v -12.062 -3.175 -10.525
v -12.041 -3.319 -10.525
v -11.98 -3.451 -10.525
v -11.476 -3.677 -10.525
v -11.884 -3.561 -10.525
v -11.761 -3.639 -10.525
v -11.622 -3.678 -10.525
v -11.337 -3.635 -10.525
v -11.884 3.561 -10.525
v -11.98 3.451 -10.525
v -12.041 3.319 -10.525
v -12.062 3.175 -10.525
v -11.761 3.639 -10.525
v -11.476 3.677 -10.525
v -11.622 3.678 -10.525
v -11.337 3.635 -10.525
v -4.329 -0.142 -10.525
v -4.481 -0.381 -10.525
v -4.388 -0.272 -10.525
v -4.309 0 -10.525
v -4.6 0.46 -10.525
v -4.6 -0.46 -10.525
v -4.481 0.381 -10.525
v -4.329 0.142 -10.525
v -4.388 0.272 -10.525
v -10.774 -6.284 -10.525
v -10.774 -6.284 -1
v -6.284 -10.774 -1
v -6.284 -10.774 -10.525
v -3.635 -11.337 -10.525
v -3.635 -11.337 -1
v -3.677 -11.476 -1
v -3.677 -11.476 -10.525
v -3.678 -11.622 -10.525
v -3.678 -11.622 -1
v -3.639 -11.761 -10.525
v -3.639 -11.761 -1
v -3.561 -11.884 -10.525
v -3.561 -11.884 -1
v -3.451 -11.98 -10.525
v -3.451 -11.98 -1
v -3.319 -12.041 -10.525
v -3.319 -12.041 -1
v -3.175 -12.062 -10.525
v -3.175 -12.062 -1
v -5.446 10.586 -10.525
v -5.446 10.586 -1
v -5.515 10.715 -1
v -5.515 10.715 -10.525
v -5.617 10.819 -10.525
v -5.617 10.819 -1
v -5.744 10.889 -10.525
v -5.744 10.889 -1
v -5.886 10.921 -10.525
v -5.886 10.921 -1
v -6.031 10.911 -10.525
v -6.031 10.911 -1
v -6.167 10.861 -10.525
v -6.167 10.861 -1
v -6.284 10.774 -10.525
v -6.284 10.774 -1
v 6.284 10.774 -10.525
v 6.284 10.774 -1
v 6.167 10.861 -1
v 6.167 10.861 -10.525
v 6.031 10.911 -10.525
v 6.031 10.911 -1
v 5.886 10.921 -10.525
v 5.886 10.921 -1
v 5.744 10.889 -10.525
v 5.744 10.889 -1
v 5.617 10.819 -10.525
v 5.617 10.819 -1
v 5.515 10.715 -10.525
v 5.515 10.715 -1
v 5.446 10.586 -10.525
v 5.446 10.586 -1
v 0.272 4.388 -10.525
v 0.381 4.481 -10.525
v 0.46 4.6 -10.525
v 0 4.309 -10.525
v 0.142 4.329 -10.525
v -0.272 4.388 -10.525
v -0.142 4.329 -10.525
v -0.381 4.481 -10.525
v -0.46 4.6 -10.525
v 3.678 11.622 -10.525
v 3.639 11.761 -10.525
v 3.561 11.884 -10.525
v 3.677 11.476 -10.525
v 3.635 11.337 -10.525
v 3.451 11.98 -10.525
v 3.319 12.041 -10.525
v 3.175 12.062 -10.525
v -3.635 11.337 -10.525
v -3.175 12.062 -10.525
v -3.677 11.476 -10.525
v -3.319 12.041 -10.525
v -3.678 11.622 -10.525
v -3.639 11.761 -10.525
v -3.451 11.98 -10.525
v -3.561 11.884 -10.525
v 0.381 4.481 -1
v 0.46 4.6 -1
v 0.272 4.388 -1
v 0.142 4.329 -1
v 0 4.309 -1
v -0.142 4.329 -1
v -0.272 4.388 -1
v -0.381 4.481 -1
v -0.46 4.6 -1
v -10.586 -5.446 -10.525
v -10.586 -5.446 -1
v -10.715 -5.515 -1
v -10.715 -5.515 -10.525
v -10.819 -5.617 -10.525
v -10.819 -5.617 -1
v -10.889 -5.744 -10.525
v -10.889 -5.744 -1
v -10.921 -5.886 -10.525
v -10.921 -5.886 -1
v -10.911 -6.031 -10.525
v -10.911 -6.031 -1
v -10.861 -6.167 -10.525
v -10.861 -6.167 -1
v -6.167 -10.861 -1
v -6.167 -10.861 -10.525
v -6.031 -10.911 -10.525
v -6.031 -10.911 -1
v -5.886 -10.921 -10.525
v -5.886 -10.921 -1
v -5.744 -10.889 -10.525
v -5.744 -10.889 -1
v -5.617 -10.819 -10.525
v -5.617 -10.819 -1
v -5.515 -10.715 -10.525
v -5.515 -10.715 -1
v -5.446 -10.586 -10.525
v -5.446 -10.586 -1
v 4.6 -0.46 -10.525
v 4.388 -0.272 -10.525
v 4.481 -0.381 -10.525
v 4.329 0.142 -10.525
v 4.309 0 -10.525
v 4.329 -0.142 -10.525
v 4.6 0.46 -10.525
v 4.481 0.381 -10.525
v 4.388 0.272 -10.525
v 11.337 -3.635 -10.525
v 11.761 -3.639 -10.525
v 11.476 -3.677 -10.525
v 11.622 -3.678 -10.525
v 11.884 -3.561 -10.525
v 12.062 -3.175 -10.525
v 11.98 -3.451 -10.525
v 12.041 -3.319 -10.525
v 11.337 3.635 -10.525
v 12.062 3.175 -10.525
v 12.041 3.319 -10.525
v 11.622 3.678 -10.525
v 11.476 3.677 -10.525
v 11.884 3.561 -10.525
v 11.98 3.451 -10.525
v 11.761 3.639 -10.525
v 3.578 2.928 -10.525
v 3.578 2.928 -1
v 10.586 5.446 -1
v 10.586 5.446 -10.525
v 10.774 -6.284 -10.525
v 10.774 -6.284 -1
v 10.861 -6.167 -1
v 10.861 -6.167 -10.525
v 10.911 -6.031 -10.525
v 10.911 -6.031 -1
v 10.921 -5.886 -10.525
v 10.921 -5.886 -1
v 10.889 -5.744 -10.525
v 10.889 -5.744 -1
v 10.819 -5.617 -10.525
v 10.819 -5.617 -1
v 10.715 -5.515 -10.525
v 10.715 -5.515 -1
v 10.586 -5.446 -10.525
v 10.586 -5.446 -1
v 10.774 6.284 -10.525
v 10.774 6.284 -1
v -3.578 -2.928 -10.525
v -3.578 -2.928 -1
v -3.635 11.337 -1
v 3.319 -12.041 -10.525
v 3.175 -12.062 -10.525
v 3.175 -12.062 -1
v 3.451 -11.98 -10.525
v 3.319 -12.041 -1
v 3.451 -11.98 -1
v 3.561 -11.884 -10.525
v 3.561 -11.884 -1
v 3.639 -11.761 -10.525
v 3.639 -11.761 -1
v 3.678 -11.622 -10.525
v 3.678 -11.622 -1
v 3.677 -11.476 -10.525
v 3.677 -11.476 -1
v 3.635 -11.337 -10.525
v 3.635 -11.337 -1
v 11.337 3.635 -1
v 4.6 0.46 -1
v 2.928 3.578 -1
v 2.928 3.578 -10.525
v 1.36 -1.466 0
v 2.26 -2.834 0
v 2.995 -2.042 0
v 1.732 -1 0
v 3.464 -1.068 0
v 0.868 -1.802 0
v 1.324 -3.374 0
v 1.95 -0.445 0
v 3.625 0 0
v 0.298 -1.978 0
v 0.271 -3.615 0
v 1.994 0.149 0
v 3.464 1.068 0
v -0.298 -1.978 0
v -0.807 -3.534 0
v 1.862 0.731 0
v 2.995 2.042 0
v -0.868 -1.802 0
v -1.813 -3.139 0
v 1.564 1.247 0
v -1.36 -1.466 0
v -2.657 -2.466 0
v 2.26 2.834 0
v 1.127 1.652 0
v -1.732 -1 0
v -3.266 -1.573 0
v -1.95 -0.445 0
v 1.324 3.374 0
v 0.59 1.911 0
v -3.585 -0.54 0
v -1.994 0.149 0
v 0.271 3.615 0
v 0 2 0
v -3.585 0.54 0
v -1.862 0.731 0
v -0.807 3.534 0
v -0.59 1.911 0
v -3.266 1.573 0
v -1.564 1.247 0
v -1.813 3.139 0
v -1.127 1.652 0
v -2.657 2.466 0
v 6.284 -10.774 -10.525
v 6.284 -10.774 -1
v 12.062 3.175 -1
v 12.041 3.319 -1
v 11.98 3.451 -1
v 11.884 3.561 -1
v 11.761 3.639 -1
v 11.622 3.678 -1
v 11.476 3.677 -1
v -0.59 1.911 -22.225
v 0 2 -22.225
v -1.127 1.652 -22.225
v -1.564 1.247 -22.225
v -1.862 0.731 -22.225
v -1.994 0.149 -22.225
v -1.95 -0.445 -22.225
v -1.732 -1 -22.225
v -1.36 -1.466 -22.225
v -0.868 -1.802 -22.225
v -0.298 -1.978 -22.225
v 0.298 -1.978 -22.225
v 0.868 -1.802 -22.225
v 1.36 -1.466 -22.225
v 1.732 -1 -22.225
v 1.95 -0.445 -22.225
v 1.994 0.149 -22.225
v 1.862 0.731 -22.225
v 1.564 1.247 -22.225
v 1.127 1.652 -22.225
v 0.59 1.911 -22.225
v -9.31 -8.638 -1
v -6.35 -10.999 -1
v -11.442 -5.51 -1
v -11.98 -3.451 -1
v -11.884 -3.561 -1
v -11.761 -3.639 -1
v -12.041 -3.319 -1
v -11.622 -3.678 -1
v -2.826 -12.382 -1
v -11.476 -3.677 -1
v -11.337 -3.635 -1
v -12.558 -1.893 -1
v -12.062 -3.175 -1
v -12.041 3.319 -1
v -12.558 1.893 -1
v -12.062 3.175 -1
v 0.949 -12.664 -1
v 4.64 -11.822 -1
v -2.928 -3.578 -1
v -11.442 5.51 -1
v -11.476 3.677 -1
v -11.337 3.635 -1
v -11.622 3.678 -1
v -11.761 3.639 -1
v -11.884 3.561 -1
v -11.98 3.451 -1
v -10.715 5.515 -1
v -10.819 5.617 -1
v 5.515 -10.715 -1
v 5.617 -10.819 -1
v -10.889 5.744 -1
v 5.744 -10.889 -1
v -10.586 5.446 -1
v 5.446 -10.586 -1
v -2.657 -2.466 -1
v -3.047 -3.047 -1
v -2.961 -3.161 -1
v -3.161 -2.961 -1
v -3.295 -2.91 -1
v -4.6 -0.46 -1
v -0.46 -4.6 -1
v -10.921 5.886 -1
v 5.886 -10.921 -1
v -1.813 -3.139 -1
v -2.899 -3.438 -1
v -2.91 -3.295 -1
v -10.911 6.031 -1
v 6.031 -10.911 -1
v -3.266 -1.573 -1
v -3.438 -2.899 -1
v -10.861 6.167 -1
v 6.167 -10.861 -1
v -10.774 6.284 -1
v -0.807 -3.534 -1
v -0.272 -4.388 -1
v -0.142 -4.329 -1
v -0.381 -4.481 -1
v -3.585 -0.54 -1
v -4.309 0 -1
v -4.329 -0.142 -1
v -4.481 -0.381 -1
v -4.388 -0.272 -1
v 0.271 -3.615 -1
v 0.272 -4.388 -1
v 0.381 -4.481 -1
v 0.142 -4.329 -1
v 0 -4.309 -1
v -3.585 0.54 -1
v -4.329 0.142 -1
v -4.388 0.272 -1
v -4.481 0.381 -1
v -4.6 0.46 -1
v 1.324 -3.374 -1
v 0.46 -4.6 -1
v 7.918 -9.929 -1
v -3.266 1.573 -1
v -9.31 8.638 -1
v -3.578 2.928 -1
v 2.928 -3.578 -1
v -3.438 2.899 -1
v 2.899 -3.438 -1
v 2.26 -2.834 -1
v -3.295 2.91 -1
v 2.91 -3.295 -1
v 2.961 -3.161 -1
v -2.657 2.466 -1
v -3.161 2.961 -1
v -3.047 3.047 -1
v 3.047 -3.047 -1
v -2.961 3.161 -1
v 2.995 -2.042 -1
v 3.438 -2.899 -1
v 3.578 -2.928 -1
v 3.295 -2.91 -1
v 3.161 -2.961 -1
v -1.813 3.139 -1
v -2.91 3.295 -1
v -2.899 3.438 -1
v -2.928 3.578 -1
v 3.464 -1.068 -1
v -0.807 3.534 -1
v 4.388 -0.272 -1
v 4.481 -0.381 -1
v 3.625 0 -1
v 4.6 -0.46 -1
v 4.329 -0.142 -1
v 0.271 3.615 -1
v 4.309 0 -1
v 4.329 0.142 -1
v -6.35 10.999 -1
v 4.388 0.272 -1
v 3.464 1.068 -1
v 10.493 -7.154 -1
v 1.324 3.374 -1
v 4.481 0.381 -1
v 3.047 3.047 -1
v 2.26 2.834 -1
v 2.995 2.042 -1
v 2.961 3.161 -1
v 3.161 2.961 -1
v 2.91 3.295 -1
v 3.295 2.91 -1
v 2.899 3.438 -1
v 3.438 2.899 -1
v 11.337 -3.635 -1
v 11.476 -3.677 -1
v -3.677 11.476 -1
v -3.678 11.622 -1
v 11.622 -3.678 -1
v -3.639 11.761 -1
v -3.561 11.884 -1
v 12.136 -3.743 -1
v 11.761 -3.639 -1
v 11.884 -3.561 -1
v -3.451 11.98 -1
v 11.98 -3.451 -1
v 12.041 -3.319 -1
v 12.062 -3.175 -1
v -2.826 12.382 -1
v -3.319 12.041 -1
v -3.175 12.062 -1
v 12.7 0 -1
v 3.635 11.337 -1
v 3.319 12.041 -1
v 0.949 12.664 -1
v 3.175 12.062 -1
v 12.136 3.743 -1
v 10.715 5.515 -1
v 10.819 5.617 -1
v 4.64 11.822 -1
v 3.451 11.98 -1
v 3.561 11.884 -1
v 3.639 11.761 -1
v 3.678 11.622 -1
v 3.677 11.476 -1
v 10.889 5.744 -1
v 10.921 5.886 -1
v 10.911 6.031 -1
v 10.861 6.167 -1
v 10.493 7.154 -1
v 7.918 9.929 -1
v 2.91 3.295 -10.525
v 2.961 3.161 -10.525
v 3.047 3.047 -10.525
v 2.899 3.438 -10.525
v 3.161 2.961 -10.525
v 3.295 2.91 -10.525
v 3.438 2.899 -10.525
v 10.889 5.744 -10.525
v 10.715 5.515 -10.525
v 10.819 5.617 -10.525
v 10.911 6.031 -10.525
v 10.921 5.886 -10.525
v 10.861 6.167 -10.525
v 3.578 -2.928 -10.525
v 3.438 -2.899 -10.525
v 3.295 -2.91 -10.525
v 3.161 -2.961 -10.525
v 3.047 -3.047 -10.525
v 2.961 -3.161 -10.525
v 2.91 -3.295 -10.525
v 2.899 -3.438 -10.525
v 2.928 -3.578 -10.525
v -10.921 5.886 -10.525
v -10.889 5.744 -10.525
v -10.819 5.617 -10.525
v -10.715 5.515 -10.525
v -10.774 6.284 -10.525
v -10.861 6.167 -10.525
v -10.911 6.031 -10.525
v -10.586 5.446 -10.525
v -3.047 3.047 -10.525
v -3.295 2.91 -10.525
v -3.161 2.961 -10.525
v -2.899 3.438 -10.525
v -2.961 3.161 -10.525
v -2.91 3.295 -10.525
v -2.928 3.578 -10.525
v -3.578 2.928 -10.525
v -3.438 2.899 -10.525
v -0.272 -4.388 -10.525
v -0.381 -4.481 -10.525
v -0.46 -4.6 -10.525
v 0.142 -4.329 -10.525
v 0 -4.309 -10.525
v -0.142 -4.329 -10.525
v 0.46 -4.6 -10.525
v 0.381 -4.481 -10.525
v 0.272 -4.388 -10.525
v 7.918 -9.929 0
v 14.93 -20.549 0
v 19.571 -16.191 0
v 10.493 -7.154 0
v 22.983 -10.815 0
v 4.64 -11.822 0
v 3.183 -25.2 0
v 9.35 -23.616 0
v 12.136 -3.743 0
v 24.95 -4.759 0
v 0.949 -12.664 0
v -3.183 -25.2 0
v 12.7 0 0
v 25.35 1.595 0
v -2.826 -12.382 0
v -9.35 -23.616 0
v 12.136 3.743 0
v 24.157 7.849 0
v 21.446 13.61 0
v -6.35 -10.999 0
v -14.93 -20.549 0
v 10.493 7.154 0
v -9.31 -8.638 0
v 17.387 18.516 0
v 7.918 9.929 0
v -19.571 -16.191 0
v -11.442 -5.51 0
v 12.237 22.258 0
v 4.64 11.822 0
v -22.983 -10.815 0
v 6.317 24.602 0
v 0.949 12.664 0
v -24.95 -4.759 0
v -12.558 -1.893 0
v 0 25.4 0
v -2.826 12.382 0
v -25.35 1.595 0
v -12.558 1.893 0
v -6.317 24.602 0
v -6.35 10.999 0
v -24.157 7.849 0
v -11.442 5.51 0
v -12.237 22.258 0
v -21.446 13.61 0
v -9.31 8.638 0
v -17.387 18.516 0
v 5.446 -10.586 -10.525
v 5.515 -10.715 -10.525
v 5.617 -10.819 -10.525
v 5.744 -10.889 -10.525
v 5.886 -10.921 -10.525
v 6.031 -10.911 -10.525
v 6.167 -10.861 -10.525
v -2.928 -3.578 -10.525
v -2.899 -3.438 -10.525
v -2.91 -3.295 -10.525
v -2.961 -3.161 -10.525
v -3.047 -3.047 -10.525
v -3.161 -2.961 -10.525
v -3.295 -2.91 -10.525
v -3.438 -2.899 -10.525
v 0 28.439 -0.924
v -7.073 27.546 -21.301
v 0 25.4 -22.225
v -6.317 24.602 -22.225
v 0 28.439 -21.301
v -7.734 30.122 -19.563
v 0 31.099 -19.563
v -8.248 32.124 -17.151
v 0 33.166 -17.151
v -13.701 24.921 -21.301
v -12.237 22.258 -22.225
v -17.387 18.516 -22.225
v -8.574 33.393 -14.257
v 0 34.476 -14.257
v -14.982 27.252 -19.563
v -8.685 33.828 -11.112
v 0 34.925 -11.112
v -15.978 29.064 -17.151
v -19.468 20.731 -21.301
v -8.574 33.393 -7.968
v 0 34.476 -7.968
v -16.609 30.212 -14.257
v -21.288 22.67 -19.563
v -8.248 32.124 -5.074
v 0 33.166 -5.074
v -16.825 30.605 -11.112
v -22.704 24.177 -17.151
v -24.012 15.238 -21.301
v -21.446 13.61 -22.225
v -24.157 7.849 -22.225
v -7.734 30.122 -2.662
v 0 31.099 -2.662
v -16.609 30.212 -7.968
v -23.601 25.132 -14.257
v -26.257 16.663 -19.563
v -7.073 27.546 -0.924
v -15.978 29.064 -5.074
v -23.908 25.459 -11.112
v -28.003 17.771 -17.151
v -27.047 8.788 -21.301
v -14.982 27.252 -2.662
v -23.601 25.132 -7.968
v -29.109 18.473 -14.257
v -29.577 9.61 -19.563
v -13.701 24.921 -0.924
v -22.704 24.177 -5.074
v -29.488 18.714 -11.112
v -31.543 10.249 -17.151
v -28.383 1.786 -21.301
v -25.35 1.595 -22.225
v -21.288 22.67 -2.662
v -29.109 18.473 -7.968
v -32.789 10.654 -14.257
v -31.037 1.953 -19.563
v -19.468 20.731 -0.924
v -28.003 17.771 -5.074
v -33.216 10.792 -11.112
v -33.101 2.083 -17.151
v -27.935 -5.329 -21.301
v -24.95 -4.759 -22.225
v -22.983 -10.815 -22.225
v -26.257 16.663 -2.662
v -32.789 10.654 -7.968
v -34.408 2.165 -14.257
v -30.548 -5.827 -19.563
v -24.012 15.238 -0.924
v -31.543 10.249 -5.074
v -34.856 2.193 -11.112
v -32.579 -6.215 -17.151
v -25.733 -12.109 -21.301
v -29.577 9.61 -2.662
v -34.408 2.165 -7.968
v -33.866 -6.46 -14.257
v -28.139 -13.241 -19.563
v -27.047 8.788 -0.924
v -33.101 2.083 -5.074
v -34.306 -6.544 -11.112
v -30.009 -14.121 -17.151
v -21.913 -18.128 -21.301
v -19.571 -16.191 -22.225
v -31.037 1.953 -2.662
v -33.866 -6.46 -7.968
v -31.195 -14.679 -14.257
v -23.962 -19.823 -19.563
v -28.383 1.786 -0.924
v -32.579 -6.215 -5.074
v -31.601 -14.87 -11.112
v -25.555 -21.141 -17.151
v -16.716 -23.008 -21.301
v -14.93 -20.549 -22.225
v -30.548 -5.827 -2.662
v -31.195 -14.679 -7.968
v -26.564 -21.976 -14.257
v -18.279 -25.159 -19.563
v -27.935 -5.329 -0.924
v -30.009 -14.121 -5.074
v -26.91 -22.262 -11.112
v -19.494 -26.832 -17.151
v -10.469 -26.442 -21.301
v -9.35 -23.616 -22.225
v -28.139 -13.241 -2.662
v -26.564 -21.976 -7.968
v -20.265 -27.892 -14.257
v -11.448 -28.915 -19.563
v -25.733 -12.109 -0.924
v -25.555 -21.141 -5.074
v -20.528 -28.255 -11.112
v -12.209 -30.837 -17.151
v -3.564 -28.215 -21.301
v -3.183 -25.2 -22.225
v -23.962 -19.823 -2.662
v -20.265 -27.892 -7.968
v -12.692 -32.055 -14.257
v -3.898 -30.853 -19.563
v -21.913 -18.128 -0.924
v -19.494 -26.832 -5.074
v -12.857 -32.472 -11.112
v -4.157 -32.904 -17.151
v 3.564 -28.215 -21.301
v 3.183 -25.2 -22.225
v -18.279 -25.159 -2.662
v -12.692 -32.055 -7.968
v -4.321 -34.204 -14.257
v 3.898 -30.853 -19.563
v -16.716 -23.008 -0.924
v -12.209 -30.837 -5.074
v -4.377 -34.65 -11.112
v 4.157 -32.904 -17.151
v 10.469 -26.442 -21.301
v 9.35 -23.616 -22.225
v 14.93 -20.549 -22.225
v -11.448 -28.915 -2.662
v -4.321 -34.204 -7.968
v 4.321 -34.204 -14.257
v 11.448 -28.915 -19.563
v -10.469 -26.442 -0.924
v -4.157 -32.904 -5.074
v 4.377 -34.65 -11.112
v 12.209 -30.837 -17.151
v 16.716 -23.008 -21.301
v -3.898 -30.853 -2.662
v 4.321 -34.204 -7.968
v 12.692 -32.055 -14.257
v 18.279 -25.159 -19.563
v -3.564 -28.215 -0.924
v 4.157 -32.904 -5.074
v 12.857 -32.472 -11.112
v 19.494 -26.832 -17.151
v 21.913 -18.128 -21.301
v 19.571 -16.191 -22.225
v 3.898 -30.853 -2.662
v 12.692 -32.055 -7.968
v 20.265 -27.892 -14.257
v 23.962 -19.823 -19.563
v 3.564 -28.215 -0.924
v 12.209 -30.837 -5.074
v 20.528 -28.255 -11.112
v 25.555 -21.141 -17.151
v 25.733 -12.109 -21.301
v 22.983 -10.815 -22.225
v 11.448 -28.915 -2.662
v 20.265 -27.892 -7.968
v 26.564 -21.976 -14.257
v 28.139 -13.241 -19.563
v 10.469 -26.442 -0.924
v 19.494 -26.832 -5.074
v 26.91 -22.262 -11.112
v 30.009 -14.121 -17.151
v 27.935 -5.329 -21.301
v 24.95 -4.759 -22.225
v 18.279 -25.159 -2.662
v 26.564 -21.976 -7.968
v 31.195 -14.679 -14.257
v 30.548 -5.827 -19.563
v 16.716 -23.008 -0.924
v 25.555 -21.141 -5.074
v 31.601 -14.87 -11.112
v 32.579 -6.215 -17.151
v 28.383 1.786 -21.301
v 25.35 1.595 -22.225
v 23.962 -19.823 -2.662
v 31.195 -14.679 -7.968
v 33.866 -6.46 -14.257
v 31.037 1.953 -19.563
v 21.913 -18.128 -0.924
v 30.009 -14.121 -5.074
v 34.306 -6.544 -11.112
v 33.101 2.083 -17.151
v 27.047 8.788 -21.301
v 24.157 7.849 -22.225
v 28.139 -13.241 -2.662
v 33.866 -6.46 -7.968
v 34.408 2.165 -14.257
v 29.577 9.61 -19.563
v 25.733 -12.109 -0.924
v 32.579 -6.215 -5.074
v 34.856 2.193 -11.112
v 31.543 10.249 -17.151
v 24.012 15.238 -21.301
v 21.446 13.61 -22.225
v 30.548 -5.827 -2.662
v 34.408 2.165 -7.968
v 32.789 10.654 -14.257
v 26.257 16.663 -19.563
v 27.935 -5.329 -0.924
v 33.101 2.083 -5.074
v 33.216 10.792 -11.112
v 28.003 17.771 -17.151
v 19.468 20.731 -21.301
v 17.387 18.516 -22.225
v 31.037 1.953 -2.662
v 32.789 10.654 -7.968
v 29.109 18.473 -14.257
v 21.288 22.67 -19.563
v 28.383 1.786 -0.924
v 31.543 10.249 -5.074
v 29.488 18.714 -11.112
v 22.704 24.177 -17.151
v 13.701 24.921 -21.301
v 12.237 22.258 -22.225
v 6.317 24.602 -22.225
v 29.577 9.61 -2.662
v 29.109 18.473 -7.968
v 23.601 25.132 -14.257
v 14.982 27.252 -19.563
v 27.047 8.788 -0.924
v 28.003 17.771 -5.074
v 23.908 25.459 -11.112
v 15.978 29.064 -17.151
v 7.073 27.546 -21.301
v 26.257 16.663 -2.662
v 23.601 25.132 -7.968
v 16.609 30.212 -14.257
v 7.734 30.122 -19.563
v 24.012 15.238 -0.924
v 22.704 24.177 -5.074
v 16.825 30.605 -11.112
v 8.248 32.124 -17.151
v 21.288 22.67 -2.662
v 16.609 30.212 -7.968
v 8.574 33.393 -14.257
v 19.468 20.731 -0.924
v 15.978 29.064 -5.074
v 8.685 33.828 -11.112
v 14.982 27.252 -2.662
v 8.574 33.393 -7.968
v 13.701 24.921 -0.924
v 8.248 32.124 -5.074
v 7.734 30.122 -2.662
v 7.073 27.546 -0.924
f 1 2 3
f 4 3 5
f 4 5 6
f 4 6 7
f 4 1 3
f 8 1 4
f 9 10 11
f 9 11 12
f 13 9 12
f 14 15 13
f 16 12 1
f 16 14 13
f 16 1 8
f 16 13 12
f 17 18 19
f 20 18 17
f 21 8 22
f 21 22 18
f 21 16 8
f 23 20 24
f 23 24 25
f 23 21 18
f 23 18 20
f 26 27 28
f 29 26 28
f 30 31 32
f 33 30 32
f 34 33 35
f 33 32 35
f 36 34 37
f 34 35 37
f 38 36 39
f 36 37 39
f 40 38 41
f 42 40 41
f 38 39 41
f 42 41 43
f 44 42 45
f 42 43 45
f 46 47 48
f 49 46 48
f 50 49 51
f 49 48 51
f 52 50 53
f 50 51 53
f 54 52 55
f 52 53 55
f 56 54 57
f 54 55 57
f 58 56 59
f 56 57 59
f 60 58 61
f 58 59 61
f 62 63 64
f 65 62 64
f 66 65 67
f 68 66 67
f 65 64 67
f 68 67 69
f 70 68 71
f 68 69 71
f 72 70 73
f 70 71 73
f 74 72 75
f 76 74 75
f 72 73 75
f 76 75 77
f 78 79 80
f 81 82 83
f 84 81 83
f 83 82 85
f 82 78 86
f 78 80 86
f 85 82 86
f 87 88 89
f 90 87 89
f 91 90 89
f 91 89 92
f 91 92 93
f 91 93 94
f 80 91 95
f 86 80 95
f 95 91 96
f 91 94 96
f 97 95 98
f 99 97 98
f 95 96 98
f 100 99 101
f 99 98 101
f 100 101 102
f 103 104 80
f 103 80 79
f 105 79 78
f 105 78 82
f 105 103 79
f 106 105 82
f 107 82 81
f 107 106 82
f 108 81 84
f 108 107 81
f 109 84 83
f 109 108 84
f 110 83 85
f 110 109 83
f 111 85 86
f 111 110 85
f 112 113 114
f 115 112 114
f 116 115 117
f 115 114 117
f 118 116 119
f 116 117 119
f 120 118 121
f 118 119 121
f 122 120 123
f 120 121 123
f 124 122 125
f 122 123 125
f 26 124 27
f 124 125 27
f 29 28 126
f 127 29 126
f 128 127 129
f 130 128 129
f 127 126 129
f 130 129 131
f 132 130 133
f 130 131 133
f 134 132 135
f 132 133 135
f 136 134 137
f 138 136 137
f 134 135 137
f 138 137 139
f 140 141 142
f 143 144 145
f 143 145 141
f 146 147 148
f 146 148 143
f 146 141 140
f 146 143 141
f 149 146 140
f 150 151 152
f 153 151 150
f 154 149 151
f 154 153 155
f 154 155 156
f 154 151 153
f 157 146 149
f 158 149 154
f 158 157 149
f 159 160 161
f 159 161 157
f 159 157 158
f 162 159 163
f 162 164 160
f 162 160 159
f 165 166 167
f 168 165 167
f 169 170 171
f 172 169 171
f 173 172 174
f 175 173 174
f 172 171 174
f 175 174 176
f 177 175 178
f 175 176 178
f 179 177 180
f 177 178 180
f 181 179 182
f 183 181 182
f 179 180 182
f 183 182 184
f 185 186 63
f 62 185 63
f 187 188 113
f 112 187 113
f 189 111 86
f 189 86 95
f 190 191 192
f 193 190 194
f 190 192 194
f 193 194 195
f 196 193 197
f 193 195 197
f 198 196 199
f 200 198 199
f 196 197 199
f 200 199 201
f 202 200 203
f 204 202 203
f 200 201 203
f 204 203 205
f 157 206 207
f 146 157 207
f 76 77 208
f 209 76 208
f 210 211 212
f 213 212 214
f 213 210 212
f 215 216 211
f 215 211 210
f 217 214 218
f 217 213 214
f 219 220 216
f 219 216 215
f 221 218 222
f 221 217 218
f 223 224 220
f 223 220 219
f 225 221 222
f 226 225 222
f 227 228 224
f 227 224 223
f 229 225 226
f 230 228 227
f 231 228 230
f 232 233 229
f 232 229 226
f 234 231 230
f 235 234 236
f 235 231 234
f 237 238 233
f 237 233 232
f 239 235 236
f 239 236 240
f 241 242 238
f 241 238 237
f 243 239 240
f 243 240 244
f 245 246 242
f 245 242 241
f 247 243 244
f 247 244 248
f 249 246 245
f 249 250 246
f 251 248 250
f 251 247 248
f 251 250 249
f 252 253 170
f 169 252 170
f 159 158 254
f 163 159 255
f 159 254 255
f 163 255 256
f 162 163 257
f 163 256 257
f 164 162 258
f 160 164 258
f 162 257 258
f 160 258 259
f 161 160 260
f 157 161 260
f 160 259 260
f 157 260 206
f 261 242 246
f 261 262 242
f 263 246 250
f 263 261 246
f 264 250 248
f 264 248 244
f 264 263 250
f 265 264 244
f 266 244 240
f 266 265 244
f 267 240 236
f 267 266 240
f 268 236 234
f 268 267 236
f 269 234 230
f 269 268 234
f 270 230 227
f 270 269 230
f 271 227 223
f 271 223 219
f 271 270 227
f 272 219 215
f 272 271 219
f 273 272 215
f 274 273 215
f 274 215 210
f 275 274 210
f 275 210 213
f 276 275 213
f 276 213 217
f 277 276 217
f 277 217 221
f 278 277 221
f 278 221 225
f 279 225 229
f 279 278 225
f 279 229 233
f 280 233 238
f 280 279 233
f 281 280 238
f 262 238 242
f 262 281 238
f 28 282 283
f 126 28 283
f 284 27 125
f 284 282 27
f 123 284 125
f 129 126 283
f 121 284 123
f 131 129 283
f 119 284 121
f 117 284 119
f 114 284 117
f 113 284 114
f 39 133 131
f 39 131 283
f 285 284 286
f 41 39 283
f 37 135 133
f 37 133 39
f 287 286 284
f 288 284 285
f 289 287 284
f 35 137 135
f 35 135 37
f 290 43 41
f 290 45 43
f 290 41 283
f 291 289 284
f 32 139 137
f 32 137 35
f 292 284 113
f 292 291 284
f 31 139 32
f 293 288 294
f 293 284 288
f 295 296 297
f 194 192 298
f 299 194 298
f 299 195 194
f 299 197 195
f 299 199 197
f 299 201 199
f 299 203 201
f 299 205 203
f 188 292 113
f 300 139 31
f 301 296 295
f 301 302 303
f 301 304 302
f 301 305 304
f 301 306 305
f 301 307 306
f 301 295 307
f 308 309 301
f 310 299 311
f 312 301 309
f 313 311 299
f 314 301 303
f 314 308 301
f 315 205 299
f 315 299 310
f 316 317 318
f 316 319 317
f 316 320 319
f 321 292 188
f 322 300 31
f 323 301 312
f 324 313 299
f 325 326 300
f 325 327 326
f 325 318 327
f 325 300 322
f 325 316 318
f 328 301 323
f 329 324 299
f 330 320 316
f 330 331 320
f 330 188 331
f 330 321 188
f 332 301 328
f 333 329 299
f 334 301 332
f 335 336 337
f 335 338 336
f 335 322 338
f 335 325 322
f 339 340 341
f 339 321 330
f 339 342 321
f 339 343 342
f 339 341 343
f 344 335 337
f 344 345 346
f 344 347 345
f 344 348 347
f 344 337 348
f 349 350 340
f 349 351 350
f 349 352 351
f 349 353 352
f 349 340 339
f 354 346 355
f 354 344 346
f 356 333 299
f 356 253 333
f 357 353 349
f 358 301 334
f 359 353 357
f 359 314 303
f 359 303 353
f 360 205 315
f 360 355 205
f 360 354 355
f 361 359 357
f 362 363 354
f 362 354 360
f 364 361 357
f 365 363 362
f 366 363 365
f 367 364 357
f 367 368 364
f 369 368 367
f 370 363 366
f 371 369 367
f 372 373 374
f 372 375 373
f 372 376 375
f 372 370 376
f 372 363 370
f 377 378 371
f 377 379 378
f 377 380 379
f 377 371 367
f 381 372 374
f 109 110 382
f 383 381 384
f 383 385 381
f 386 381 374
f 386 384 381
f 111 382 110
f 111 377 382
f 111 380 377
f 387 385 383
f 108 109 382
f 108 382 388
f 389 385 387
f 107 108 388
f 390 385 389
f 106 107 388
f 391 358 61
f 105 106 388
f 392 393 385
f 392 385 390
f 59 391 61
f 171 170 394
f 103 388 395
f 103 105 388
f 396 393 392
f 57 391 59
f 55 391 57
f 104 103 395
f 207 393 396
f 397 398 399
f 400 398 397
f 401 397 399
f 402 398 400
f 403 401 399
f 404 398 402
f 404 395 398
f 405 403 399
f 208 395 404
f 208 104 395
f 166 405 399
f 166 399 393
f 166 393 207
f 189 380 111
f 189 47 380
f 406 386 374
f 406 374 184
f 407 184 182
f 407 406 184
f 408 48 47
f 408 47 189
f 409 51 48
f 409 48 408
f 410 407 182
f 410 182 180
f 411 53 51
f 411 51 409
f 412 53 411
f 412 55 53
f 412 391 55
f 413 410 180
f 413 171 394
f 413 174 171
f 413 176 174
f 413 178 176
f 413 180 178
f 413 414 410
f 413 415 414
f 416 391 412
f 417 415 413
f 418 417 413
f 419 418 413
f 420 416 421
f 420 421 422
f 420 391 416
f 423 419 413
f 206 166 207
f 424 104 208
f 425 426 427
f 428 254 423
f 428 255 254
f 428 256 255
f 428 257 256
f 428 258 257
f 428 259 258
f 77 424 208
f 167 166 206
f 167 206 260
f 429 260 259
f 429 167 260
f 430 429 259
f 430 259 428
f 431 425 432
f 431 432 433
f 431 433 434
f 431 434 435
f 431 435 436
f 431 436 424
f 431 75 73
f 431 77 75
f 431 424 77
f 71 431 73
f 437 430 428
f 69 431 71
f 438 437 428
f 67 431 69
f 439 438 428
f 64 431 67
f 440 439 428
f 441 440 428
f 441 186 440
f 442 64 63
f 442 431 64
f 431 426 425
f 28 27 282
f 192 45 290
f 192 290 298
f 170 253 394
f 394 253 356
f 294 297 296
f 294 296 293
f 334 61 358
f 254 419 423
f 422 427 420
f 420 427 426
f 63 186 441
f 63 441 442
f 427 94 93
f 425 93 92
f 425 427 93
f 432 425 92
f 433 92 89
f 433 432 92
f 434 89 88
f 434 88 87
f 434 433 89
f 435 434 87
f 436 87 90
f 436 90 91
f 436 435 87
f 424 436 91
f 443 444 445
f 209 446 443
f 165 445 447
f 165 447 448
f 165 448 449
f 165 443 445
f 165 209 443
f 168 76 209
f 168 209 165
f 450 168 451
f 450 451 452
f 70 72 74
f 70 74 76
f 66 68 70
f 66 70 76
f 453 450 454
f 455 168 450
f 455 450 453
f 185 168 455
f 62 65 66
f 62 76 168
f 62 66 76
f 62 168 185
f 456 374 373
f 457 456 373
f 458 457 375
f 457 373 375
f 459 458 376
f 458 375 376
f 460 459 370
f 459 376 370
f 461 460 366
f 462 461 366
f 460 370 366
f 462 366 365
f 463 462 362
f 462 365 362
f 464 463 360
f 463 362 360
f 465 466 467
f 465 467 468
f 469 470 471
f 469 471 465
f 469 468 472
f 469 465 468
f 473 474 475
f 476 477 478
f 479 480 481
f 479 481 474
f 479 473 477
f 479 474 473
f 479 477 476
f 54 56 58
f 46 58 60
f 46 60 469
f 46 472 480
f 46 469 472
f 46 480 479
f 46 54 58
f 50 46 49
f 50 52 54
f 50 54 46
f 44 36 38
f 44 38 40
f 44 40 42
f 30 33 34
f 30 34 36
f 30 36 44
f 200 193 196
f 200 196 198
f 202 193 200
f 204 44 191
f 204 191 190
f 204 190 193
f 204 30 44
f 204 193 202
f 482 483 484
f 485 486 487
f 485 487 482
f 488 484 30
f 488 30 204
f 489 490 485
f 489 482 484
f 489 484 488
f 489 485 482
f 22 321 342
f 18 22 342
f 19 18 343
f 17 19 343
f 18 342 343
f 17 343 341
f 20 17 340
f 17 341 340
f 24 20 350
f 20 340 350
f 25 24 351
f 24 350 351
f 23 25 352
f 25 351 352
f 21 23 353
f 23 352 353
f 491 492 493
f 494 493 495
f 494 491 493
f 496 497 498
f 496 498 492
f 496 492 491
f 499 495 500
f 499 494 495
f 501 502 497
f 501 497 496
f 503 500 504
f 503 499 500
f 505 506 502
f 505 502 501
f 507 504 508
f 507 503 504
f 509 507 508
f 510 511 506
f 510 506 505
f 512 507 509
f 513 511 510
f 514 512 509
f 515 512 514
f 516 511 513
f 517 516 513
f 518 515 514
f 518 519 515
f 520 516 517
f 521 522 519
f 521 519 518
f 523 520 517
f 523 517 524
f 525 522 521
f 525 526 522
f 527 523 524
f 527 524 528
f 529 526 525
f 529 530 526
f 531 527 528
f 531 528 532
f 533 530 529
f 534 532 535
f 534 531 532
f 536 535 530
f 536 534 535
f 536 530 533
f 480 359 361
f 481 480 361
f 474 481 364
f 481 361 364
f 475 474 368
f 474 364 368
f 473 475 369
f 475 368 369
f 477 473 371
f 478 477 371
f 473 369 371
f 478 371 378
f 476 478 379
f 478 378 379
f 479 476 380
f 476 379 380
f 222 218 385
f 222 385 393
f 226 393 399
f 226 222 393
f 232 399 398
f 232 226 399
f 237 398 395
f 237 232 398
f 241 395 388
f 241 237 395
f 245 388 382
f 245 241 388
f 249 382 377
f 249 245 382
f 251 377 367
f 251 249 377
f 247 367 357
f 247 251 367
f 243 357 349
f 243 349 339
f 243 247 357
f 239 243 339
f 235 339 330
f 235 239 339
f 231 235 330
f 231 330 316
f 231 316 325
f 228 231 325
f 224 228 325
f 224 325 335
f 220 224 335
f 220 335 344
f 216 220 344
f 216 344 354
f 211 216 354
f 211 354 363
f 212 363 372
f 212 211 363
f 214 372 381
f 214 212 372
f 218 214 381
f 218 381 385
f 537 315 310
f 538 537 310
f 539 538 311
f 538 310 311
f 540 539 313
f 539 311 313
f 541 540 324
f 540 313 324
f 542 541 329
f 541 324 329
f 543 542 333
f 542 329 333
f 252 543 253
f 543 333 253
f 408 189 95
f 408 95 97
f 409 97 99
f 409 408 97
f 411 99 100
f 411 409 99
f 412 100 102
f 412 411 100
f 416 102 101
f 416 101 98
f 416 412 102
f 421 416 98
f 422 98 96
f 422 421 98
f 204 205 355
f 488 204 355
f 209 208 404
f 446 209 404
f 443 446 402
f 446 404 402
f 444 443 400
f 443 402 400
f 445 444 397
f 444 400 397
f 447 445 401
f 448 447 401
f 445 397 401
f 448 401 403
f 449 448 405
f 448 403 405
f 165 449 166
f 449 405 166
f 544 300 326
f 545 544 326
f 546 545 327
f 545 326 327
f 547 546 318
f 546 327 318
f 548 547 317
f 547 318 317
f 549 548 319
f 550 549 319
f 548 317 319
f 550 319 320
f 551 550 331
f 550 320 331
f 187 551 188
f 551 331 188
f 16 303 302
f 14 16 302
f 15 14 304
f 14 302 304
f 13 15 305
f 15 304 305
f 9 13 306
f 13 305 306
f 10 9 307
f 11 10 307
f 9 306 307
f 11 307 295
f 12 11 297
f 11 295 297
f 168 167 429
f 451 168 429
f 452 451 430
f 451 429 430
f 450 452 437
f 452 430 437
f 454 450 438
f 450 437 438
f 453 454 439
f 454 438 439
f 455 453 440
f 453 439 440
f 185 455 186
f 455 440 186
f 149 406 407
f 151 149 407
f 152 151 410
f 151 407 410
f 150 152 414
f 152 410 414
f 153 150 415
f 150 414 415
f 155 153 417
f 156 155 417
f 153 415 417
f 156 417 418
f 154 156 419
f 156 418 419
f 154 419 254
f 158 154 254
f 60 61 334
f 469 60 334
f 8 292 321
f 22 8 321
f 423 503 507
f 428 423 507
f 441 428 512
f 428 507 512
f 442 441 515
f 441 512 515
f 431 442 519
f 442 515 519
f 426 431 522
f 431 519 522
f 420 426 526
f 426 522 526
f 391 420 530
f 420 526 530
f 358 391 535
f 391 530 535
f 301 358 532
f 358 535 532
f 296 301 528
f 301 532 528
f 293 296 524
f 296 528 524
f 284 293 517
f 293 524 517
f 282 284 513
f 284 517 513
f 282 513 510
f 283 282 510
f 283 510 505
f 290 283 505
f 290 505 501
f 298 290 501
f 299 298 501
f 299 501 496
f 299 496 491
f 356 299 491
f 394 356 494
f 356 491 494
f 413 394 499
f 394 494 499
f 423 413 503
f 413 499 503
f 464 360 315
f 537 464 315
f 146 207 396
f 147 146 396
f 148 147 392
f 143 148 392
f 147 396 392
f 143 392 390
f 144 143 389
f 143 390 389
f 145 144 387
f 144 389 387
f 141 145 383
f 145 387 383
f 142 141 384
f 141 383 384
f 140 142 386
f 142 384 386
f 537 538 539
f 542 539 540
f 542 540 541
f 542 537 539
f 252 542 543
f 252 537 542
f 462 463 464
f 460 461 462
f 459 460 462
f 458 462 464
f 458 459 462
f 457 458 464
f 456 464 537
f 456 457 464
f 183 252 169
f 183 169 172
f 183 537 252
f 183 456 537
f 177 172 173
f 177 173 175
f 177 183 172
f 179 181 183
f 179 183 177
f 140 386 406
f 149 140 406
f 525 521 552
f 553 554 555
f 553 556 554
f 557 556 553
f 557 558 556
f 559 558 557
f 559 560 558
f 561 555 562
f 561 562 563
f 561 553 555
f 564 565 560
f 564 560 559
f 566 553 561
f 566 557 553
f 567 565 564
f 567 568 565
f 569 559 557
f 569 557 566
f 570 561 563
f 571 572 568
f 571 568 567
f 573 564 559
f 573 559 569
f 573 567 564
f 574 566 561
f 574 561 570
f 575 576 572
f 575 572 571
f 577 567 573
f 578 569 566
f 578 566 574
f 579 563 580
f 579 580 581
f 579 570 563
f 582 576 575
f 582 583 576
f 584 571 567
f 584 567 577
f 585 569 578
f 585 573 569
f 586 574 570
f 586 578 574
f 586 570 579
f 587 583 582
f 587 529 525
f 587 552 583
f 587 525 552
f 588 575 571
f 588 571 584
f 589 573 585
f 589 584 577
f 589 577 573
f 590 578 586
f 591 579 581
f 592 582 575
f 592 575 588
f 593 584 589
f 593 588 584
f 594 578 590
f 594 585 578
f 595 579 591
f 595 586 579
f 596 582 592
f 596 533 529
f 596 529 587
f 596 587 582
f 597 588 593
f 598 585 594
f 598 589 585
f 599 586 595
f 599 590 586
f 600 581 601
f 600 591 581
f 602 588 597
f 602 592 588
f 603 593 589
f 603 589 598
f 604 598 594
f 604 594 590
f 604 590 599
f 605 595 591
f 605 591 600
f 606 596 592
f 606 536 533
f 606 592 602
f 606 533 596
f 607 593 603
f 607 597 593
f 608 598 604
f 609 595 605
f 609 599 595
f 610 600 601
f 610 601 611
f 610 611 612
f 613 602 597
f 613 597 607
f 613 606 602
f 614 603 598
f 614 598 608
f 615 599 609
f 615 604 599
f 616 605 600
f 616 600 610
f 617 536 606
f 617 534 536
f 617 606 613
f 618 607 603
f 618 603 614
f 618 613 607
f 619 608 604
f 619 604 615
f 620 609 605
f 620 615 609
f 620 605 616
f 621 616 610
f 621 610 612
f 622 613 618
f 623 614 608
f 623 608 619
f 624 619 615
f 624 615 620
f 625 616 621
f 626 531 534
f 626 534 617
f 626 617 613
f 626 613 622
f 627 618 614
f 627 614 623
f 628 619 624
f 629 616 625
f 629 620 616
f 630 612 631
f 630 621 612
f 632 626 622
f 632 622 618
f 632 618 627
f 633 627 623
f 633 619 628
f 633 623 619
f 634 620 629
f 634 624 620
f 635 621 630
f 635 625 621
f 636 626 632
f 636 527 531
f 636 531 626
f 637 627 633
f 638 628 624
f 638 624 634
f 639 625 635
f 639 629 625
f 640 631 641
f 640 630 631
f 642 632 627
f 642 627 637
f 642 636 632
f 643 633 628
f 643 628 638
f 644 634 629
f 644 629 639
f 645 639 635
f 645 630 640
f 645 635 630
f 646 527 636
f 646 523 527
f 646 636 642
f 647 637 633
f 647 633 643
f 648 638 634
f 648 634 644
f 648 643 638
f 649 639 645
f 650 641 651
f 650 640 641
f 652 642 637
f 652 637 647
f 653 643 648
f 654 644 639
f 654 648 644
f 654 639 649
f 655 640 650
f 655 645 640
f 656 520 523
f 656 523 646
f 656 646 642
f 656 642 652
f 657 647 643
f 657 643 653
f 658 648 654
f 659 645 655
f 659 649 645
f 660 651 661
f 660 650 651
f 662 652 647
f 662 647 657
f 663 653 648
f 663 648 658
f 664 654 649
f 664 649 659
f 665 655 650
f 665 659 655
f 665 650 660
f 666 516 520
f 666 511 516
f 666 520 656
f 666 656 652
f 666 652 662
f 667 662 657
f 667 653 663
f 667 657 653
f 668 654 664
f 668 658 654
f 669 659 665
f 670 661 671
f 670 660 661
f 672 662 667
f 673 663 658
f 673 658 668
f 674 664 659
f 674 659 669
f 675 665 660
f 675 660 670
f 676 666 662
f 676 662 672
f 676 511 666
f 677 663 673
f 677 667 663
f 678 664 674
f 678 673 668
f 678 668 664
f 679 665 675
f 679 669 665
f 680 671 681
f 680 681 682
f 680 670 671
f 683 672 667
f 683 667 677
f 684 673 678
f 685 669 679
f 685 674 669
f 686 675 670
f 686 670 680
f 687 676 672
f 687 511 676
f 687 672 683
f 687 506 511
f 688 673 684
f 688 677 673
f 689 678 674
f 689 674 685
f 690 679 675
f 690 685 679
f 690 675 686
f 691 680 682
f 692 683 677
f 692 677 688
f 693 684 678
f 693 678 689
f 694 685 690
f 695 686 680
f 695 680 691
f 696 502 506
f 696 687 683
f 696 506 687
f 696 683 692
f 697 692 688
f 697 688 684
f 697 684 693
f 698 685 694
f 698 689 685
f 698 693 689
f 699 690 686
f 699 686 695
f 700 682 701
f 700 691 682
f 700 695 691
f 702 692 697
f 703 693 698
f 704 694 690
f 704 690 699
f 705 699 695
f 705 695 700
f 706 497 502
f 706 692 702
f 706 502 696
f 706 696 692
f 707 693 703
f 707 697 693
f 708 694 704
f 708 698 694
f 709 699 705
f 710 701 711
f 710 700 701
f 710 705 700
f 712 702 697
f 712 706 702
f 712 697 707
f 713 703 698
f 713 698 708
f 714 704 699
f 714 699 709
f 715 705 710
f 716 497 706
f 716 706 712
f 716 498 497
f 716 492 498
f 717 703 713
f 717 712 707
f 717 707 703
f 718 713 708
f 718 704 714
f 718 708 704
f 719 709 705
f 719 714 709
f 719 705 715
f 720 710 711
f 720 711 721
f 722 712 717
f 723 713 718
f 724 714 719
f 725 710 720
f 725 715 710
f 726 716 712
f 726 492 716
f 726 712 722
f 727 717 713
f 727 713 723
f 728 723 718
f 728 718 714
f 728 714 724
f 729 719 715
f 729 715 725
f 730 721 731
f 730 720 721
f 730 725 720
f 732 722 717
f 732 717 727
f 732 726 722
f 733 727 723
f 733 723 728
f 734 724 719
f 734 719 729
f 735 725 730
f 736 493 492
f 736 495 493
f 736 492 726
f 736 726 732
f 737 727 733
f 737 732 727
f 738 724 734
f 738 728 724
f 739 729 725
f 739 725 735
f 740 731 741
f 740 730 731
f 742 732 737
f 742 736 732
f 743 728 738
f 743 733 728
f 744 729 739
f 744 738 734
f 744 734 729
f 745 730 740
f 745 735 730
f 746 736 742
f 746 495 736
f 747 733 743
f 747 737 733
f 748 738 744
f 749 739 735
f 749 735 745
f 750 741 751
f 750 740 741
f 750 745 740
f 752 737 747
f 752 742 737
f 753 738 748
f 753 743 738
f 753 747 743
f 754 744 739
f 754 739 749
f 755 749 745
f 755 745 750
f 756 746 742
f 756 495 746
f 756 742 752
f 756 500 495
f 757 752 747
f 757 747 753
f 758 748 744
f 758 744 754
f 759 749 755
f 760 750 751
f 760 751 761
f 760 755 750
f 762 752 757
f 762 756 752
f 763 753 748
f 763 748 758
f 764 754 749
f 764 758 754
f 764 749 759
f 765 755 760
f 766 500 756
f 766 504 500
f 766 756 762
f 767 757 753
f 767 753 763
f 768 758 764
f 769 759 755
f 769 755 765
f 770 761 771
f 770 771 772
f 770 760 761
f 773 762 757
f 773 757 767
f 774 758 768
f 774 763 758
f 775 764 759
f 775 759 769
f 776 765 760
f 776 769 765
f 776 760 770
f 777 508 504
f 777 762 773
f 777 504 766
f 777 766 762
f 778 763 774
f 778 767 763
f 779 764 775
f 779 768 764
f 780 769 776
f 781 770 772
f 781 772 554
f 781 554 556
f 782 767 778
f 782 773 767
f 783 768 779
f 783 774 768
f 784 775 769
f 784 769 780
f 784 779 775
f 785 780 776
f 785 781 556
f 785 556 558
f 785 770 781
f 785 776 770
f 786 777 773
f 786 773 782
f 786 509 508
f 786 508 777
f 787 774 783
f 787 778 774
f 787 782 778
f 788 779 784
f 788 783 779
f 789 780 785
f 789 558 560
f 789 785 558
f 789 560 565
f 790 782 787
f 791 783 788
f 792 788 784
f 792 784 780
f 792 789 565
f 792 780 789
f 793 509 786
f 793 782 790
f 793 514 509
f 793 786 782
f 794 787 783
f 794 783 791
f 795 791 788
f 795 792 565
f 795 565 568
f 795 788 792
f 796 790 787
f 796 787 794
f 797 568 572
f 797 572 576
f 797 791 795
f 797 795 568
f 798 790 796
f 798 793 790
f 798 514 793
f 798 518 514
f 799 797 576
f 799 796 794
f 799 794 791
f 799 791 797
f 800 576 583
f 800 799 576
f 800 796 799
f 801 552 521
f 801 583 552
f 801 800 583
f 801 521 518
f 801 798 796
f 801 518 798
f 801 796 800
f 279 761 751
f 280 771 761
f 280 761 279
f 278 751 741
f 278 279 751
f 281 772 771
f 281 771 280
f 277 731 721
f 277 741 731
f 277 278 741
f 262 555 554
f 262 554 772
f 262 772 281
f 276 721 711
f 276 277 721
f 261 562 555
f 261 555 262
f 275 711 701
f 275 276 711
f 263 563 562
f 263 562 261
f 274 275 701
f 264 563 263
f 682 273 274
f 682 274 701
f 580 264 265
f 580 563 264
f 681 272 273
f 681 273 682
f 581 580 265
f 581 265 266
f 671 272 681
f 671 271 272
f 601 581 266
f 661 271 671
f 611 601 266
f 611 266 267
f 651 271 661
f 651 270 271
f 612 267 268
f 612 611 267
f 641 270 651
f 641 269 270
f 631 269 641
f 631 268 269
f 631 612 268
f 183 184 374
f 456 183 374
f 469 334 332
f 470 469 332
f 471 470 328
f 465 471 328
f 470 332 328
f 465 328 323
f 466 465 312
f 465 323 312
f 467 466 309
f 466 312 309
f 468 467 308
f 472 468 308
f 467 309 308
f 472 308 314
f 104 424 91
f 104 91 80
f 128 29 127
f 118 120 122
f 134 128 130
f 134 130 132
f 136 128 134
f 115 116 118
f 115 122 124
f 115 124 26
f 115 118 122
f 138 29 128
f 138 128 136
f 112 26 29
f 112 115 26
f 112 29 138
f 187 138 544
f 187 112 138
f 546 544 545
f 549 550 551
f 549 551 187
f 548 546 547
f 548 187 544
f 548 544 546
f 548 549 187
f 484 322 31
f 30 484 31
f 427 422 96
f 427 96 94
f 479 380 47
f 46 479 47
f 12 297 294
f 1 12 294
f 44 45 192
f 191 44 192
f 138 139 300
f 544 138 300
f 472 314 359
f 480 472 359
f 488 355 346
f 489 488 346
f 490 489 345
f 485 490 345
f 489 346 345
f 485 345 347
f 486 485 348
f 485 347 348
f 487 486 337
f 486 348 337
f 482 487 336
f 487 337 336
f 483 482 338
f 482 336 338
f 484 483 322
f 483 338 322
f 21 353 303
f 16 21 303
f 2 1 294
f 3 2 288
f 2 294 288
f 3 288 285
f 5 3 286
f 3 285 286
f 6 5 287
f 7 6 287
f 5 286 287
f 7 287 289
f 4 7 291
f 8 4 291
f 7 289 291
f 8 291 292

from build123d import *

# Parameters (mm, degrees)
SKETCH2_R          = 12.7
SKETCH2_R_2        = 3.625
CUT_EXTRUDE1_DEPTH = 1
CUT_EXTRUDE2_DEPTH = 9.525


with BuildPart() as part:
    # Sketch1 → Revolve1 (revolve)
    with BuildSketch(Plane(origin=(0, 0, 0), x_dir=(0, 0, -1), z_dir=(1, 0, 0))):
        with BuildLine():
            Line((0, 25.4), (0, 2))
            Line((0, 2), (22.225, 2))
            Line((22.225, 2), (22.225, 25.4))
            ThreePointArc((22.225, 25.4), (11.1125, 34.925), (0, 25.4))
        make_face()
    revolve(axis=Axis((0, 0, -22.225), (0, 0, 1)))

    # Sketch2 → Cut-Extrude1 (cut)
    with BuildSketch(Plane.XY):
        Circle(SKETCH2_R)
        Circle(SKETCH2_R_2, mode=Mode.SUBTRACT)
    extrude(amount=-CUT_EXTRUDE1_DEPTH, mode=Mode.SUBTRACT)

    # Sketch3 → Cut-Extrude2 (cut)
    with BuildSketch(Plane.XY.offset(-1)):
        with BuildLine():
            Line((-0.459525068, 4.600054071), (-3.634525068, 11.337002474))
            ThreePointArc((-3.634525068, 11.337002474), (-3.603998477, 11.825642279), (-3.175, 12.061568196))
            Line((-3.175, 12.061568196), (3.175, 12.061568196))
            ThreePointArc((3.175, 12.061568196), (3.603998477, 11.825642279), (3.634525068, 11.337002474))
            Line((3.634525068, 11.337002474), (0.459525068, 4.600054071))
            ThreePointArc((0.459525068, 4.600054071), (0, 4.308619792), (-0.459525068, 4.600054071))
        make_face()
        with BuildLine():
            Line((3.577662719, 2.927796135), (10.58646865, 5.446474006))
            ThreePointArc((10.58646865, 5.446474006), (10.91040361, 5.813580085), (10.773880693, 6.283752633))
            Line((10.773880693, 6.283752633), (6.283752633, 10.773880693))
            ThreePointArc((6.283752633, 10.773880693), (5.813580085, 10.91040361), (5.446474006, 10.58646865))
            Line((5.446474006, 10.58646865), (2.927796135, 3.577662719))
            ThreePointArc((2.927796135, 3.577662719), (3.046654273, 3.046654273), (3.577662719, 2.927796135))
        make_face()
        with BuildLine():
            Line((4.600054071, -0.459525068), (11.337002474, -3.634525068))
            ThreePointArc((11.337002474, -3.634525068), (11.825642279, -3.603998477), (12.061568196, -3.175))
            Line((12.061568196, -3.175), (12.061568196, 3.175))
            ThreePointArc((12.061568196, 3.175), (11.825642279, 3.603998477), (11.337002474, 3.634525068))
            Line((11.337002474, 3.634525068), (4.600054071, 0.459525068))
            ThreePointArc((4.600054071, 0.459525068), (4.308619792, 0), (4.600054071, -0.459525068))
        make_face()
        with BuildLine():
            Line((2.927796135, -3.577662719), (5.446474006, -10.58646865))
            ThreePointArc((5.446474006, -10.58646865), (5.813580085, -10.91040361), (6.283752633, -10.773880693))
            Line((6.283752633, -10.773880693), (10.773880693, -6.283752633))
            ThreePointArc((10.773880693, -6.283752633), (10.91040361, -5.813580085), (10.58646865, -5.446474006))
            Line((10.58646865, -5.446474006), (3.577662719, -2.927796135))
            ThreePointArc((3.577662719, -2.927796135), (3.046654273, -3.046654273), (2.927796135, -3.577662719))
        make_face()
        with BuildLine():
            Line((-0.459525068, -4.600054071), (-3.634525068, -11.337002474))
            ThreePointArc((-3.634525068, -11.337002474), (-3.603998477, -11.825642279), (-3.175, -12.061568196))
            Line((-3.175, -12.061568196), (3.175, -12.061568196))
            ThreePointArc((3.175, -12.061568196), (3.603998477, -11.825642279), (3.634525068, -11.337002474))
            Line((3.634525068, -11.337002474), (0.459525068, -4.600054071))
            ThreePointArc((0.459525068, -4.600054071), (0, -4.308619792), (-0.459525068, -4.600054071))
        make_face()
        with BuildLine():
            Line((-3.577662719, -2.927796135), (-10.58646865, -5.446474006))
            ThreePointArc((-10.58646865, -5.446474006), (-10.91040361, -5.813580085), (-10.773880693, -6.283752633))
            Line((-10.773880693, -6.283752633), (-6.283752633, -10.773880693))
            ThreePointArc((-6.283752633, -10.773880693), (-5.813580085, -10.91040361), (-5.446474006, -10.58646865))
            Line((-5.446474006, -10.58646865), (-2.927796135, -3.577662719))
            ThreePointArc((-2.927796135, -3.577662719), (-3.046654273, -3.046654273), (-3.577662719, -2.927796135))
        make_face()
        with BuildLine():
            Line((-4.600054071, 0.459525068), (-11.337002474, 3.634525068))
            ThreePointArc((-11.337002474, 3.634525068), (-11.825642279, 3.603998477), (-12.061568196, 3.175))
            Line((-12.061568196, 3.175), (-12.061568196, -3.175))
            ThreePointArc((-12.061568196, -3.175), (-11.825642279, -3.603998477), (-11.337002474, -3.634525068))
            Line((-11.337002474, -3.634525068), (-4.600054071, -0.459525068))
            ThreePointArc((-4.600054071, -0.459525068), (-4.308619792, 0), (-4.600054071, 0.459525068))
        make_face()
        with BuildLine():
            Line((-2.927796135, 3.577662719), (-5.446474006, 10.58646865))
            ThreePointArc((-5.446474006, 10.58646865), (-5.813580085, 10.91040361), (-6.283752633, 10.773880693))
            Line((-6.283752633, 10.773880693), (-10.773880693, 6.283752633))
            ThreePointArc((-10.773880693, 6.283752633), (-10.91040361, 5.813580085), (-10.58646865, 5.446474006))
            Line((-10.58646865, 5.446474006), (-3.577662719, 2.927796135))
            ThreePointArc((-3.577662719, 2.927796135), (-3.046654273, 3.046654273), (-2.927796135, 3.577662719))
        make_face()
    extrude(amount=-CUT_EXTRUDE2_DEPTH, mode=Mode.SUBTRACT)


solid = part.part
